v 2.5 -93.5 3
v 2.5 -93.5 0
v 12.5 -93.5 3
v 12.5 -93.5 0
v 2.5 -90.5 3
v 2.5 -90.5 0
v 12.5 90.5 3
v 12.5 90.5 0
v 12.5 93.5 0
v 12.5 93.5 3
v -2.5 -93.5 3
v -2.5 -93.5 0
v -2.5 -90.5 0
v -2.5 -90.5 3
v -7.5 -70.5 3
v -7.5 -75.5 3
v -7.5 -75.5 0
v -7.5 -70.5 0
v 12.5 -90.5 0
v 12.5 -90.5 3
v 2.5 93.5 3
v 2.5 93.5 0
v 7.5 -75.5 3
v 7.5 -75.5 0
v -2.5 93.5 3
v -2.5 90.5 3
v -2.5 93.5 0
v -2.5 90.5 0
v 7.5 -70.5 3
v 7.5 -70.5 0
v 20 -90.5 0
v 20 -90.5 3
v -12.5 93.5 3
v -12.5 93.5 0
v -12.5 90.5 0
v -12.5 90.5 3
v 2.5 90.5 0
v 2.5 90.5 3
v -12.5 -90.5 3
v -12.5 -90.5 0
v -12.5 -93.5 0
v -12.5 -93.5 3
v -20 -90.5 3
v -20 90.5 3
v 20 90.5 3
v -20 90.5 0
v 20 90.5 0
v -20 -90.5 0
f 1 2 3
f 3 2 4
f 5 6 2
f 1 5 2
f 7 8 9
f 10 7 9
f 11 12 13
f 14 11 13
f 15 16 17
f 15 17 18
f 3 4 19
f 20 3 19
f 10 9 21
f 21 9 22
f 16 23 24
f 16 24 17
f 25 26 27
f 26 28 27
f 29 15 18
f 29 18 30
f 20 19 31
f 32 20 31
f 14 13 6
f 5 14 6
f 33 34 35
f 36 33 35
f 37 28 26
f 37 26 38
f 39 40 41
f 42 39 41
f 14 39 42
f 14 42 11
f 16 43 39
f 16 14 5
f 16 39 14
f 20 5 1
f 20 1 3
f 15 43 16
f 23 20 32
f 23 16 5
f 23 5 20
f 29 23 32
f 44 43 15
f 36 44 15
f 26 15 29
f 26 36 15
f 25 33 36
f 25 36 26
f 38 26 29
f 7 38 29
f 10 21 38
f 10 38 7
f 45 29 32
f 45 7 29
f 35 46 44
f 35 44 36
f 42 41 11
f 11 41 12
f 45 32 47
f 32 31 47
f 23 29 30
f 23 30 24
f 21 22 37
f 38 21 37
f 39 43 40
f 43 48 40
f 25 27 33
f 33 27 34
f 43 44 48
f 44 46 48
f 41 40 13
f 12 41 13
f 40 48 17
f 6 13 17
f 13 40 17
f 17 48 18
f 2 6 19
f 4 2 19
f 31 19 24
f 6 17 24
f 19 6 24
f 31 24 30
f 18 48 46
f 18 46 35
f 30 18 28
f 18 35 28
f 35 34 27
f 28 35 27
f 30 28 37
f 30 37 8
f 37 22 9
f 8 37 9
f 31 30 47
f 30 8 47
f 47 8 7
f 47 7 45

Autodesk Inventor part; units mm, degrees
ref_plane "YZ Plane" through (0, 0, 0) normal (1, 0, 0) x (0, 1, 0)
ref_plane "XZ Plane" through (0, 0, 0) normal (0, 1, 0) x (-1, 0, 0)
ref_plane "XY Plane" through (0, 0, 0) normal (0, 0, 1) x (1, 0, 0)
sketch "Sketch1" plane through (0, 0, 0) normal (0, 0, 1) x (1, 0, 0)
  line L0 (20, -90.5) -> (20, 90.5)
  line L1 (-20, 90.5) -> (-20, -90.5)
  line L2 (-20, -90.5) -> (20, 90.5) construction
  line L3 (20, -90.5) -> (-20, 90.5) construction
  line L4 (-2.5, 90.5) -> (-2.5, 93.5)
  line L5 (-2.5, 93.5) -> (-12.5, 93.5)
  line L6 (-12.5, 93.5) -> (-12.5, 90.5)
  line L7 (12.5, 90.5) -> (12.5, 93.5)
  line L8 (12.5, 93.5) -> (2.5, 93.5)
  line L9 (2.5, 93.5) -> (2.5, 90.5)
  line L10 (12.5, 90.5) -> (20, 90.5)
  line L11 (-2.5, 90.5) -> (2.5, 90.5)
  line L12 (-20, 90.5) -> (-12.5, 90.5)
  line L13 (-20, -90.5) -> (-12.5, -90.5)
  line L14 (-12.5, -90.5) -> (-12.5, -93.5)
  line L15 (-12.5, -93.5) -> (-2.5, -93.5)
  line L16 (-2.5, -93.5) -> (-2.5, -90.5)
  line L17 (-2.5, -90.5) -> (2.5, -90.5)
  line L18 (2.5, -90.5) -> (2.5, -93.5)
  line L19 (2.5, -93.5) -> (12.5, -93.5)
  line L20 (12.5, -93.5) -> (12.5, -90.5)
  line L21 (12.5, -90.5) -> (20, -90.5)
  point P0 (0, 0)
  dimension "d0" = 40
  dimension "d1" = 181
  dimension "d2" = 10
  dimension "d3" = 3
  dimension "d4" = 7.5
  dimension "d5" = 10
  dimension "d6" = 3
  dimension "d7" = 5
  dimension "d8" = 7.5
  dimension "d9" = 3
  dimension "d10" = 10
  dimension "d11" = 5
  dimension "d12" = 3
  dimension "d13" = 10
  dimension "d14" = 3
  dimension "d15" = 12.462
  dimension "d16" = 90
  dimension "d17" = 0
extrude "Extrusion1" add sketch "Sketch1" along normal blind 3
sketch "Sketch2" plane through (0, 0, 3) normal (0, 0, 1) x (1, 0, 0)
  line L0 (-7.5, -70.5) -> (7.5, -70.5)
  line L1 (7.5, -70.5) -> (7.5, -75.5)
  line L2 (7.5, -75.5) -> (-7.5, -75.5)
  line L3 (-7.5, -75.5) -> (-7.5, -70.5)
  line L4 (-7.5, -70.5) -> (7.5, -75.5) construction
  line L5 (7.5, -70.5) -> (-7.5, -75.5) construction
  line L6 (-2.5, -90.5) -> (2.5, -90.5) projected
  line L7 (-20, 90.5) -> (-20, -90.5) projected
  point P0 (0, 0)
  point P1 (0, -73)
  dimension "d20" = 15
  dimension "d21" = 5
  dimension "d22" = 15
  dimension "d23" = 12.5
extrude "Extrusion2" cut sketch "Sketch2" against normal blind 10
equation "\"BendRadius\" = Thickness"
equation "\"BendReliefWidth\" = Thickness"
equation "\"BendReliefDepth\" = 0.5 * Thickness"
equation "\"CornerReliefSize\" = 4 * Thickness"
equation "\"MinimumRemnant\" = 2 * Thickness"
equation "\"TransitionRadius\" = BendRadius"
equation "\"JacobiRadiusSize\" = BendRadius"
equation "\"GapSize\" = Thickness"
equation "\"Thickness\" = 0.5"
properties part number "4 binnen dikke cover plaat"
